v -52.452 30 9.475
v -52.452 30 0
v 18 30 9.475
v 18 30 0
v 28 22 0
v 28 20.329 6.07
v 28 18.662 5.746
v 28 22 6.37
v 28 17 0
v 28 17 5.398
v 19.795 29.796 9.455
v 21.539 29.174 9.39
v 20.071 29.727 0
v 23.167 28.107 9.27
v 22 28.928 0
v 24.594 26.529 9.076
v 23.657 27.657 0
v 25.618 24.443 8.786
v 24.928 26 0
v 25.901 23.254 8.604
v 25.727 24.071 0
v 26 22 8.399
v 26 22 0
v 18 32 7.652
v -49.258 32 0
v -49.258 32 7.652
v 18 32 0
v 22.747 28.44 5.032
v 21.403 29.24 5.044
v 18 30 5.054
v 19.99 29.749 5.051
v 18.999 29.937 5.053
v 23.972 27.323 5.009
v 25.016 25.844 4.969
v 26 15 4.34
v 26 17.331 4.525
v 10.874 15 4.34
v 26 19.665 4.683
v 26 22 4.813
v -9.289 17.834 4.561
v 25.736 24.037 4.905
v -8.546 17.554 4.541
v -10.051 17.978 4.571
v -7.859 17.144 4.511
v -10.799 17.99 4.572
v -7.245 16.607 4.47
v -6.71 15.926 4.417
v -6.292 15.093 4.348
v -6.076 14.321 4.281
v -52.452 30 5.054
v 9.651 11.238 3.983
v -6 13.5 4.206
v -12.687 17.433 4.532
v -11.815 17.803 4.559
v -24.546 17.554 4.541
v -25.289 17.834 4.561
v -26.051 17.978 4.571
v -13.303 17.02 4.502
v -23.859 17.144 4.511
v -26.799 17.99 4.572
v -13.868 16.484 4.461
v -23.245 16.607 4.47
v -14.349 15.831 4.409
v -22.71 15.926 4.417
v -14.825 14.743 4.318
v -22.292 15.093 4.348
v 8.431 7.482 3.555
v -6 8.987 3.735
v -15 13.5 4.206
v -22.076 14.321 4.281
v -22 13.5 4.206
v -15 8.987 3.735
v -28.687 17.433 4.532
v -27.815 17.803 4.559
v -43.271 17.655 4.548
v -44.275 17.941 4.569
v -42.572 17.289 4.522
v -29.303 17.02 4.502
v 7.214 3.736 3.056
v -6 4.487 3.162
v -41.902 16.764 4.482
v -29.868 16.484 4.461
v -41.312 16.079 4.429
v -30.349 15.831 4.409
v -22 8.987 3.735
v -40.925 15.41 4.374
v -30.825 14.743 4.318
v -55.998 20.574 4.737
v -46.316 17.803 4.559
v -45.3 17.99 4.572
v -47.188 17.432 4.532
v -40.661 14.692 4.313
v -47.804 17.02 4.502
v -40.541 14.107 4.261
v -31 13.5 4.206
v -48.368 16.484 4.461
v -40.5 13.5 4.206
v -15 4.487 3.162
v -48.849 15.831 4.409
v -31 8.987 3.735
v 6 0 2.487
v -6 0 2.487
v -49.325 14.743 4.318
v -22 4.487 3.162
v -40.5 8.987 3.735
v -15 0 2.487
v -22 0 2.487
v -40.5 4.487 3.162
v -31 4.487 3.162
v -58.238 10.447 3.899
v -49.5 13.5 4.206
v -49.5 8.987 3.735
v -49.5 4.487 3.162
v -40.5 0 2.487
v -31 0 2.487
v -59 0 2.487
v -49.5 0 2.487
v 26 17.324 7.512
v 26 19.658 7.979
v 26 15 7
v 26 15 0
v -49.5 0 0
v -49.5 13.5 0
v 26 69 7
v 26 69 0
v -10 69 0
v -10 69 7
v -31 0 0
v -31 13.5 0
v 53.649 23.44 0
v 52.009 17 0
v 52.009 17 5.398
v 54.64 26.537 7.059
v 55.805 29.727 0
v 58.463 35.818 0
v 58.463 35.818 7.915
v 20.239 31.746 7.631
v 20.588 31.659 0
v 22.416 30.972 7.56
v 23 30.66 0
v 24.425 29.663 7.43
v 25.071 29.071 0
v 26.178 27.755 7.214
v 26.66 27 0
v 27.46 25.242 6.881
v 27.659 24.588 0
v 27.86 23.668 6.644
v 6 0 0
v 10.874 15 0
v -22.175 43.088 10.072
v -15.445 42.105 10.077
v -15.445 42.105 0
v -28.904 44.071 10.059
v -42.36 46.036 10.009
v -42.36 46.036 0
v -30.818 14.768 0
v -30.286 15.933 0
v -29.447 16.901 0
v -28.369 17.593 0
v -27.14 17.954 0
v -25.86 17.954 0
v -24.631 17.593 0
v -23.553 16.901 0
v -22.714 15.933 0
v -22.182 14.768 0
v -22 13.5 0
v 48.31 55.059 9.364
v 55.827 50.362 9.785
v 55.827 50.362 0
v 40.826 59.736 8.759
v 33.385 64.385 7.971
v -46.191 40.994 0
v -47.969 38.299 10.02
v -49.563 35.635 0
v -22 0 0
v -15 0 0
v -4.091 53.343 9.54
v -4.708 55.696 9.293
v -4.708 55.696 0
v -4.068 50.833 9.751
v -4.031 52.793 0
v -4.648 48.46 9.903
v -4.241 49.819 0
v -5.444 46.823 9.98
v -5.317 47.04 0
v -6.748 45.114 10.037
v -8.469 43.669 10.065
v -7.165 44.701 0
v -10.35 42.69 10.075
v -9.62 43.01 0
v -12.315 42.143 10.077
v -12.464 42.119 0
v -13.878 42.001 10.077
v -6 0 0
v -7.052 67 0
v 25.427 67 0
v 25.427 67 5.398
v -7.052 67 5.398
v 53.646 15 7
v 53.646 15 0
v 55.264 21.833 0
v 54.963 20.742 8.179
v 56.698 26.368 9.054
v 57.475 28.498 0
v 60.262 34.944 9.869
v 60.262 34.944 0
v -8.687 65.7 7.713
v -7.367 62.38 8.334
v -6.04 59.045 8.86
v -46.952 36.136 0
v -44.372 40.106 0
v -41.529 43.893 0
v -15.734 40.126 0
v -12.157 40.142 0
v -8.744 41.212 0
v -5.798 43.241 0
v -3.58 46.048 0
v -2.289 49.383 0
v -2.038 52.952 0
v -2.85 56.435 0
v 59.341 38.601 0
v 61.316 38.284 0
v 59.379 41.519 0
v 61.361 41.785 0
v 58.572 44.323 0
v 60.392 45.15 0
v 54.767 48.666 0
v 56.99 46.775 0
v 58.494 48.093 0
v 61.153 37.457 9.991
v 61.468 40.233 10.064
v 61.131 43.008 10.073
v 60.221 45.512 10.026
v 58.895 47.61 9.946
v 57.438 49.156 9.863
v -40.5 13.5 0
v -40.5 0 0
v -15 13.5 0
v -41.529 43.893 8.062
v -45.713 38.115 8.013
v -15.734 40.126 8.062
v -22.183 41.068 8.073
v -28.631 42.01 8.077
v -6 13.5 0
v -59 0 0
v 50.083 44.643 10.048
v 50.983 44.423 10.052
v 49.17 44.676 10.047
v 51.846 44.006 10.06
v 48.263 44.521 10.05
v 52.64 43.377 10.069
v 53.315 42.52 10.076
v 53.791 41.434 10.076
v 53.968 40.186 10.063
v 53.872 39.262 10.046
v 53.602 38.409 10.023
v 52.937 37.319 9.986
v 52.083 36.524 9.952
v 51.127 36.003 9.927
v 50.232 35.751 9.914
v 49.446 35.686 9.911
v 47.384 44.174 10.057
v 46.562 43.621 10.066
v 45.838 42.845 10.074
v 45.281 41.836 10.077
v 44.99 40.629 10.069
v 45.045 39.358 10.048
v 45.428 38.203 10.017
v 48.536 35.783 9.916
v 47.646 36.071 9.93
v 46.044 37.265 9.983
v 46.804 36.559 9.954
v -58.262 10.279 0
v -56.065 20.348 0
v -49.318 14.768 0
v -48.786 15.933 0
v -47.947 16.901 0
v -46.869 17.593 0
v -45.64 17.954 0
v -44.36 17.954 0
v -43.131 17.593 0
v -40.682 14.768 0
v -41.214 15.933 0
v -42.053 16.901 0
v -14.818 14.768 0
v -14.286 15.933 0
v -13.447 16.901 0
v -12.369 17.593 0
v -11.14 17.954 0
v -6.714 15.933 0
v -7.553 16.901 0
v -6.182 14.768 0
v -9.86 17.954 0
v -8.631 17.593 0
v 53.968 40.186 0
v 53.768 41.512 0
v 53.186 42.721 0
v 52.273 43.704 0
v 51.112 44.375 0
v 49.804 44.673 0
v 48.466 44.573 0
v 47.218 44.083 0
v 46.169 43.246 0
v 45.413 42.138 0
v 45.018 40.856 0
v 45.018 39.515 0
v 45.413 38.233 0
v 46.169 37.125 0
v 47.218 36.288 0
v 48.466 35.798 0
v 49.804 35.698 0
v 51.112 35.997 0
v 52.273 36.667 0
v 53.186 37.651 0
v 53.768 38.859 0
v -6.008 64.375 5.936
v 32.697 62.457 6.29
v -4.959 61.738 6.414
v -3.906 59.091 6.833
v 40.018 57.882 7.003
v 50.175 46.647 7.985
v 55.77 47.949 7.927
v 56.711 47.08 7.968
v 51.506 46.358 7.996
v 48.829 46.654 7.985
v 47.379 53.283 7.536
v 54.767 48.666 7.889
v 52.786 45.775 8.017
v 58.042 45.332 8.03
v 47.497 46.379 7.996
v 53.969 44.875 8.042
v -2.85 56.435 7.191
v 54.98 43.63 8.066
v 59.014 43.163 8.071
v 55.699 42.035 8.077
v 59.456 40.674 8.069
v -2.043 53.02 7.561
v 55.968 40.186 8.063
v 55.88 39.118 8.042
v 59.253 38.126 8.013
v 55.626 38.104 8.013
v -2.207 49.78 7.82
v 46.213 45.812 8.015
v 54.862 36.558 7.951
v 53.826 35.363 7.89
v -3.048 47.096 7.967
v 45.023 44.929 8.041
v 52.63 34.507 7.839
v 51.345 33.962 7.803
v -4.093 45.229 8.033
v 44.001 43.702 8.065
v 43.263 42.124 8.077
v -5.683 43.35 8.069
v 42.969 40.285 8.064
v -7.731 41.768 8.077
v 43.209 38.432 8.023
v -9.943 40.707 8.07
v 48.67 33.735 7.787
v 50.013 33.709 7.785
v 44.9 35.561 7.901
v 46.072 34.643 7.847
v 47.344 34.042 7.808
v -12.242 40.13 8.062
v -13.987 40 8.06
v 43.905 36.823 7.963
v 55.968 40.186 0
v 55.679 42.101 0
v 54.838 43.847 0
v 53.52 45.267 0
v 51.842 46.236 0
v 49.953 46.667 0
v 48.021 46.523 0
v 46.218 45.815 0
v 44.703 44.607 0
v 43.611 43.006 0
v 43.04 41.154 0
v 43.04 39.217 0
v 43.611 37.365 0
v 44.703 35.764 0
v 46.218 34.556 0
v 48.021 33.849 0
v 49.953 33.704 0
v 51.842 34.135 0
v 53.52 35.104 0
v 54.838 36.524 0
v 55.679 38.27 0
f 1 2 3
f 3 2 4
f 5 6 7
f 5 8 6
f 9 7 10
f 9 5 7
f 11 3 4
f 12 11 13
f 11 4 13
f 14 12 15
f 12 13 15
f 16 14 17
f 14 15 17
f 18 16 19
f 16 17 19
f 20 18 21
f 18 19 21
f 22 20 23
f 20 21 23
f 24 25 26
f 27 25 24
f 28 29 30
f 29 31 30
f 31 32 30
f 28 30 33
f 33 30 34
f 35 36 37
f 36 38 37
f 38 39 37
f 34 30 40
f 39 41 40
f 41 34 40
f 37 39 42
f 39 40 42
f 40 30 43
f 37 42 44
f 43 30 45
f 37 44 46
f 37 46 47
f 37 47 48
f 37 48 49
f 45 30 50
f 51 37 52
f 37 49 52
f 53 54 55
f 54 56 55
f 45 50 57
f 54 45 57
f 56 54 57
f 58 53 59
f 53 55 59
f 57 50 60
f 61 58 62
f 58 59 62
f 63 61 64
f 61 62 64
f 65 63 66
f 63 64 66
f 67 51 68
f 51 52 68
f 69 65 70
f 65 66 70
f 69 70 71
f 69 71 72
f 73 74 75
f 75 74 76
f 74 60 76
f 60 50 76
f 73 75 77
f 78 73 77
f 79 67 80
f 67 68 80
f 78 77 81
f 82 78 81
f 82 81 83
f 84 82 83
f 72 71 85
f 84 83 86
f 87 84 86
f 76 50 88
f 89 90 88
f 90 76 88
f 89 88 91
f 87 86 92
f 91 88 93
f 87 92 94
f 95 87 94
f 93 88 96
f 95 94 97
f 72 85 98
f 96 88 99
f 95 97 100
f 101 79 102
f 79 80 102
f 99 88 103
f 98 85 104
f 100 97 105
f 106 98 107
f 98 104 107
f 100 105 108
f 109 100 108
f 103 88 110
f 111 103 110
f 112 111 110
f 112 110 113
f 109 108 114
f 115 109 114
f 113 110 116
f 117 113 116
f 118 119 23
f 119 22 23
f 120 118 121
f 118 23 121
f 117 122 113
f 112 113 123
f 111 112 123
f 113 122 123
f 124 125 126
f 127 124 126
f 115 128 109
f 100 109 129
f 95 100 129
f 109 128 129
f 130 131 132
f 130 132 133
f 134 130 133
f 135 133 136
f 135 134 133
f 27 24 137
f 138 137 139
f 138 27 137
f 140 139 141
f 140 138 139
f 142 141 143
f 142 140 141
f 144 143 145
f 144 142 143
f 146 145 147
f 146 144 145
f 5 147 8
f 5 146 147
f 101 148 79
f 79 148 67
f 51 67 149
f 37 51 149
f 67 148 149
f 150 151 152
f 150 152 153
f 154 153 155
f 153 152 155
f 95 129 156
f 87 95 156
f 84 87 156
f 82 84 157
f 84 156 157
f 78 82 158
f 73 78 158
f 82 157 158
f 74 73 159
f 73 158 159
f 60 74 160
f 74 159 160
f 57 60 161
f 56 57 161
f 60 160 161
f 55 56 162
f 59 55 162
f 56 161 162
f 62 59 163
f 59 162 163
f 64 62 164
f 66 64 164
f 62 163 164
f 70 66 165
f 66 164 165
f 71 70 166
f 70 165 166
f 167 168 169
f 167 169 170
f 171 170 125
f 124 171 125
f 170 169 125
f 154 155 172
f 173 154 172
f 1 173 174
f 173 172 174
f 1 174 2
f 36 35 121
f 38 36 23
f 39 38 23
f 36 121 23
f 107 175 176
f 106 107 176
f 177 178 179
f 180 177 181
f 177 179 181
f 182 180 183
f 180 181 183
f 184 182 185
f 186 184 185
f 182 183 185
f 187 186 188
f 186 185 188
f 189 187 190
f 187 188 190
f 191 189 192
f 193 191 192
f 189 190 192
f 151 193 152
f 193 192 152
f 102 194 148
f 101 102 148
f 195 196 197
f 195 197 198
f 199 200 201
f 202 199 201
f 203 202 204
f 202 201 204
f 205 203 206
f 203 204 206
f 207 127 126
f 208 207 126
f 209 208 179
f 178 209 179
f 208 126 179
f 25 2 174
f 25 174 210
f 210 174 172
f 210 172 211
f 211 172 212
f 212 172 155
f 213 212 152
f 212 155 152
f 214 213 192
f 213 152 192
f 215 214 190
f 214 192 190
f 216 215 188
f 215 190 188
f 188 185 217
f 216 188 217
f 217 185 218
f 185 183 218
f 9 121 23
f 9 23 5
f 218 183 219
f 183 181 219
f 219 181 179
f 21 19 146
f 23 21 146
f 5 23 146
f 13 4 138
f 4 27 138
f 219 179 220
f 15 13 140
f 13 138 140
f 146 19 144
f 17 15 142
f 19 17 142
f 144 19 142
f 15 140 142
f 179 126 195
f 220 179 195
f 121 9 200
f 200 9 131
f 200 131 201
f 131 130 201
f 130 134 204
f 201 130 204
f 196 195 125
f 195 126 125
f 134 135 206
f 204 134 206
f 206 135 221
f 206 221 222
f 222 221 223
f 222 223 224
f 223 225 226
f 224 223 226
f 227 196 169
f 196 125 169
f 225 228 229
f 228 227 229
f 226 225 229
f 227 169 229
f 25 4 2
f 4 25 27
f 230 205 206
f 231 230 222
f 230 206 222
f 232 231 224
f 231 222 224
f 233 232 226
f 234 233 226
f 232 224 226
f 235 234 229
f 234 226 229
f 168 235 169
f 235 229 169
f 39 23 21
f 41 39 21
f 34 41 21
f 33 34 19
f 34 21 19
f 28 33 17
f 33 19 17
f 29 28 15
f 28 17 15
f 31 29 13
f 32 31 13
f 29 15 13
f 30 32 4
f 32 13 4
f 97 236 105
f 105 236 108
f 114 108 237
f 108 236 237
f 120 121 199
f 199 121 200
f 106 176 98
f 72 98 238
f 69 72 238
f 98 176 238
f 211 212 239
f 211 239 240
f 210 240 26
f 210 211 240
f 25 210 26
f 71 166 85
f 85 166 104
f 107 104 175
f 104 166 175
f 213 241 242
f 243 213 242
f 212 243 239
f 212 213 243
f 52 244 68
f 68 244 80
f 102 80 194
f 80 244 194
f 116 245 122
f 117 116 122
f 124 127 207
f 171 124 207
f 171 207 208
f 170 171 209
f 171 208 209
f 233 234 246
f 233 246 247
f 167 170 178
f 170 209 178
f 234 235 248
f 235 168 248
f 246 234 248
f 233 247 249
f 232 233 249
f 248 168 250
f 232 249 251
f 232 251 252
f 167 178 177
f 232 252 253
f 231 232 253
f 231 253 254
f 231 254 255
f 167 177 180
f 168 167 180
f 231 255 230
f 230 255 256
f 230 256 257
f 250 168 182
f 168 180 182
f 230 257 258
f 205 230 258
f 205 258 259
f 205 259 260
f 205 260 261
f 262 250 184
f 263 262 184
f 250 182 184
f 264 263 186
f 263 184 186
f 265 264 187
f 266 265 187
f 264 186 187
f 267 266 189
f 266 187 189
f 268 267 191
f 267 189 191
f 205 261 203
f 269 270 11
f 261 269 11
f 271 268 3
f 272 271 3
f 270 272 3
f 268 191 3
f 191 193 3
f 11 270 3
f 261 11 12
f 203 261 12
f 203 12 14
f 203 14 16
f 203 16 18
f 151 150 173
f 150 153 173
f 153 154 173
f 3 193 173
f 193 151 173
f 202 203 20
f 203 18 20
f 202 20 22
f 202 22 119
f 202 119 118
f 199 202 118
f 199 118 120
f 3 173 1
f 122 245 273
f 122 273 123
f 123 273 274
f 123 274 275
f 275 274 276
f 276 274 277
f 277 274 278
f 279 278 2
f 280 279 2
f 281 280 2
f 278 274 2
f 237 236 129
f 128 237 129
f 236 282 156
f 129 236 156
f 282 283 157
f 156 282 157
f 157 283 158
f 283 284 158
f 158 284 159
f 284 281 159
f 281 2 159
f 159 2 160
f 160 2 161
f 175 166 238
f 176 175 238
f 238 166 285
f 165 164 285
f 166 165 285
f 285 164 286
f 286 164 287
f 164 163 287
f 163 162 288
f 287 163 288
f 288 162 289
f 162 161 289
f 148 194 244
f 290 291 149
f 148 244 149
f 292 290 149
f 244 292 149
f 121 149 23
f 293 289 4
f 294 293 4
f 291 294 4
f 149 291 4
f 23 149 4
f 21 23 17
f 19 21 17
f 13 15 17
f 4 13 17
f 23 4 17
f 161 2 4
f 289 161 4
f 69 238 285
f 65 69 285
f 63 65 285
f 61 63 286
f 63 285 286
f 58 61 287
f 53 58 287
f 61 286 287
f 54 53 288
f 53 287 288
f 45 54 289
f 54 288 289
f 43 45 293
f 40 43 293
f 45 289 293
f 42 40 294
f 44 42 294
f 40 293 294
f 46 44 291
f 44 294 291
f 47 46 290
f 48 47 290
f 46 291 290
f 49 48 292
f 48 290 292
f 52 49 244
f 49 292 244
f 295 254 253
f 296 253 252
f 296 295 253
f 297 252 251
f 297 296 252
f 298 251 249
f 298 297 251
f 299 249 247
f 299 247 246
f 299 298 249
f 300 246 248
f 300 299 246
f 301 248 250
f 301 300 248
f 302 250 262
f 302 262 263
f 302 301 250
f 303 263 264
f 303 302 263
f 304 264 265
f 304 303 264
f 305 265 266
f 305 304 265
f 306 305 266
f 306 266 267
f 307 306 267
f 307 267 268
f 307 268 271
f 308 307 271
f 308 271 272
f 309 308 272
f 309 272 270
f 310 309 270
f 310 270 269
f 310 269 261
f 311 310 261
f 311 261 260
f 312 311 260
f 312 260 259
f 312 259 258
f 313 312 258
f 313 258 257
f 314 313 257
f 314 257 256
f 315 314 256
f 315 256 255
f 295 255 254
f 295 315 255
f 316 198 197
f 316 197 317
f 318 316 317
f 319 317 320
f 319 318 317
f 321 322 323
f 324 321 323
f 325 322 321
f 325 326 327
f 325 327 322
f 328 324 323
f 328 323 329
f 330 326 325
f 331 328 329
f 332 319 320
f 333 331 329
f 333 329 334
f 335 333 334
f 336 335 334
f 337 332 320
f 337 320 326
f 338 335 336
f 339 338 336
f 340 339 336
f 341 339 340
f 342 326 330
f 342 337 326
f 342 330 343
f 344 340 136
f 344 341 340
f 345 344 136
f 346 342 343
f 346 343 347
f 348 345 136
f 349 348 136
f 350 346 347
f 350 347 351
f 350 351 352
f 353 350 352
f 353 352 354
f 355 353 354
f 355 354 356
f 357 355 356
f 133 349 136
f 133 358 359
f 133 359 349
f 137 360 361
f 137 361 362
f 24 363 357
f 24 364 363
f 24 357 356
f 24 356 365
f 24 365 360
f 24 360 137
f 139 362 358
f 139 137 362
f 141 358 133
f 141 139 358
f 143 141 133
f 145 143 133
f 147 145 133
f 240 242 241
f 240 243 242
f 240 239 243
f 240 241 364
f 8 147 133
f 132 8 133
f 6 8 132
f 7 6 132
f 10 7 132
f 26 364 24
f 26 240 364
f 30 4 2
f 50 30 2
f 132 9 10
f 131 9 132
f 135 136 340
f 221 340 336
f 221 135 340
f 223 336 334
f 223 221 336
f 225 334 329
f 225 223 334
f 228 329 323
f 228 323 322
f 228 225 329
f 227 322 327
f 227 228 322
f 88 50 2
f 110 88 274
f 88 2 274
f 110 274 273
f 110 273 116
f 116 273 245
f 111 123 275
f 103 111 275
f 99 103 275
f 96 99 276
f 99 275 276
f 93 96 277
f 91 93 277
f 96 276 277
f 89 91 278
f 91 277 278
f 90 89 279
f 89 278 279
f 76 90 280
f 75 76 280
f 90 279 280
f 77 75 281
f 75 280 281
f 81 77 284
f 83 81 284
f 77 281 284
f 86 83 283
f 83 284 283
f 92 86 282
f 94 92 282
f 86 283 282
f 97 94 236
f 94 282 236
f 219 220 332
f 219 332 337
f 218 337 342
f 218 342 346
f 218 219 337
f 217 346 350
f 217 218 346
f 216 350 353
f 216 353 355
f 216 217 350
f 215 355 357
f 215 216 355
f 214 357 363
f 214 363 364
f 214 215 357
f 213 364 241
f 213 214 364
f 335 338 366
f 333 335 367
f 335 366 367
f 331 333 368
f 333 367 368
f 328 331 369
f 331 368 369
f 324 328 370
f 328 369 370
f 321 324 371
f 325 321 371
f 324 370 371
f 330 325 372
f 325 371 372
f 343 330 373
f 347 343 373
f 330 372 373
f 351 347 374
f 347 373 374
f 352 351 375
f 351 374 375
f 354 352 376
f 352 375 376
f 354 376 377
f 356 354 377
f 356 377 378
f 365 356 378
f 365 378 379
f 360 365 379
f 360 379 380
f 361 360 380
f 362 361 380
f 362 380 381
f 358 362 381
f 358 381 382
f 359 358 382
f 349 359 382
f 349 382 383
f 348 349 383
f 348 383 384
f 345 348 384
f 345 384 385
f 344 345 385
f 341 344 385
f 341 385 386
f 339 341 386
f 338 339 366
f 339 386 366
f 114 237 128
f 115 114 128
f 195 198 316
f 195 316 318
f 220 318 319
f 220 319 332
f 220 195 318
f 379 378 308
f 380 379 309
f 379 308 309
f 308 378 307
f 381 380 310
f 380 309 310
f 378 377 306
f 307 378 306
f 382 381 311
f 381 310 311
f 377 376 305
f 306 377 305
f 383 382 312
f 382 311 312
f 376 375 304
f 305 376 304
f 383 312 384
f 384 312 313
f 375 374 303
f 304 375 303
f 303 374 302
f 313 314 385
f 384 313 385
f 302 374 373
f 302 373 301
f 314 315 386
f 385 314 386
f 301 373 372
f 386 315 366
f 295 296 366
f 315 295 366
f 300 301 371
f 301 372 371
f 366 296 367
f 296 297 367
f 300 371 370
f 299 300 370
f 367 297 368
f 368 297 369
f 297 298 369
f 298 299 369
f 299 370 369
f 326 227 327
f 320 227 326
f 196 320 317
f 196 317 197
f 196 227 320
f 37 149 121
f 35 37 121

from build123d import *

# Parameters (mm, degrees)
SKETCH_1_R               = 4.5
EXTRUDE_1_DEPTH          = 20
CUT_EXTRUDE_1_DEPTH      = 95.547791144
CUT_EXTRUDE_1_DEPTH_BACK = 95.547791144
SKETCH_2_OUTSIDE_W       = 47.53
SKETCH_2_OUTSIDE_H       = 81.53
SKETCH_2_OUTSIDE_R       = 120
SHELL_1_T                = -2
EXTRUDE_2_DEPTH          = 10
CUT_EXTRUDE_3_DEPTH      = 93.956063424
CUT_EXTRUDE_3_DEPTH_BACK = 93.956063424


with BuildPart() as part:
    # 草图1 → 凸台-拉伸1 (new body)
    with BuildSketch(Plane.XY):
        with BuildLine():
            Line((-15.445099917, 42.104966588), (-42.359878376, 46.03568036))
            ThreePointArc((-42.359878376, 46.03568036), (-47.935865648, 38.351274786), (-52.452272688, 30))
            Line((-52.452272688, 30), (18, 30))
            ThreePointArc((18, 30), (23.656854249, 27.656854249), (26, 22))
            Line((26, 22), (26, 15))
            Line((26, 15), (53.645991862, 15))
            ThreePointArc((53.645991862, 15), (56.296565029, 25.190171372), (60.262459343, 34.94398155))
            ThreePointArc((60.262459343, 34.94398155), (61, 43.503305042), (55.826785402, 50.362155936))
            Line((55.826785402, 50.362155936), (26, 69))
            Line((26, 69), (-10, 69))
            Line((-10, 69), (-4.708099735, 55.696023467))
            ThreePointArc((-4.708099735, 55.696023467), (-6.153199652, 45.800990055), (-15.445099917, 42.104966588))
        make_face()
        with Locations((49.467754231, 40.185578782)):
            Circle(SKETCH_1_R, mode=Mode.SUBTRACT)
    extrude(amount=EXTRUDE_1_DEPTH)

    # 草图2 outside → 切除-拉伸1 (cut, two sides: drawn at the far end of the back side and taken through both)
    with BuildSketch(Plane(origin=(0, 0, 0), x_dir=(0, 0, -1), z_dir=(1, 0, 0)).offset(-CUT_EXTRUDE_1_DEPTH_BACK)):
        with Locations((-10, 42)):
            Rectangle(SKETCH_2_OUTSIDE_W, SKETCH_2_OUTSIDE_H)
        with Locations((109.923051619, 42)):
            Circle(SKETCH_2_OUTSIDE_R, mode=Mode.SUBTRACT)
    extrude(amount=CUT_EXTRUDE_1_DEPTH + CUT_EXTRUDE_1_DEPTH_BACK, mode=Mode.SUBTRACT)

    # 抽壳1
    shell_1_openings = [part.faces().sort_by_distance(p)[0] for p in [
        (15.88368629, 42.212588419, 0),
    ]]
    offset(amount=SHELL_1_T, openings=shell_1_openings)


with BuildPart() as body_2:
    # 草图1<3> → 凸台-拉伸2 (new body)
    with BuildSketch(Plane.XY):
        with BuildLine():
            Line((18, 30), (-52.452272688, 30))
            ThreePointArc((-52.452272688, 30), (-57.344024741, 15.353116402), (-59, 0))
            Line((-59, 0), (-49.5, 0))
            Line((-49.5, 0), (-49.5, 13.5))
            ThreePointArc((-49.5, 13.5), (-45, 18), (-40.5, 13.5))
            Line((-40.5, 13.5), (-40.5, 0))
            Line((-40.5, 0), (-31, 0))
            Line((-31, 0), (-31, 13.5))
            ThreePointArc((-31, 13.5), (-26.5, 18), (-22, 13.5))
            Line((-22, 13.5), (-22, 0))
            Line((-22, 0), (-15, 0))
            Line((-15, 0), (-15, 13.5))
            ThreePointArc((-15, 13.5), (-10.5, 18), (-6, 13.5))
            Line((-6, 13.5), (-6, 0))
            Line((-6, 0), (6, 0))
            Line((6, 0), (10.873795443, 15))
            Line((10.873795443, 15), (26, 15))
            Line((26, 15), (26, 22))
            ThreePointArc((26, 22), (23.656854249, 27.656854249), (18, 30))
        make_face()
    extrude(amount=EXTRUDE_2_DEPTH)

    # 草图3 → 切除-拉伸3 (cut, two sides: drawn at the far end of the back side and taken through both)
    with BuildSketch(Plane(origin=(0, 0, 0), x_dir=(0, 0, -1), z_dir=(1, 0, 0)).offset(-CUT_EXTRUDE_3_DEPTH_BACK)):
        with BuildLine():
            Line((-5.063509484, 180.832397695), (-5.063509484, 32))
            ThreePointArc((-5.063509484, 32), (-4.418319525, 15.948217756), (-2.486912352, 0))
            Line((-2.486912352, 0), (21.326271279, -146.914992049))
            Line((21.326271279, -146.914992049), (-275.378272425, -170.805244435))
            Line((-275.378272425, -170.805244435), (-301.768053188, 156.942145309))
            Line((-301.768053188, 156.942145309), (-5.063509484, 180.832397695))
        make_face()
    extrude(amount=CUT_EXTRUDE_3_DEPTH + CUT_EXTRUDE_3_DEPTH_BACK, mode=Mode.SUBTRACT)


solid = Compound([part.part, body_2.part])
